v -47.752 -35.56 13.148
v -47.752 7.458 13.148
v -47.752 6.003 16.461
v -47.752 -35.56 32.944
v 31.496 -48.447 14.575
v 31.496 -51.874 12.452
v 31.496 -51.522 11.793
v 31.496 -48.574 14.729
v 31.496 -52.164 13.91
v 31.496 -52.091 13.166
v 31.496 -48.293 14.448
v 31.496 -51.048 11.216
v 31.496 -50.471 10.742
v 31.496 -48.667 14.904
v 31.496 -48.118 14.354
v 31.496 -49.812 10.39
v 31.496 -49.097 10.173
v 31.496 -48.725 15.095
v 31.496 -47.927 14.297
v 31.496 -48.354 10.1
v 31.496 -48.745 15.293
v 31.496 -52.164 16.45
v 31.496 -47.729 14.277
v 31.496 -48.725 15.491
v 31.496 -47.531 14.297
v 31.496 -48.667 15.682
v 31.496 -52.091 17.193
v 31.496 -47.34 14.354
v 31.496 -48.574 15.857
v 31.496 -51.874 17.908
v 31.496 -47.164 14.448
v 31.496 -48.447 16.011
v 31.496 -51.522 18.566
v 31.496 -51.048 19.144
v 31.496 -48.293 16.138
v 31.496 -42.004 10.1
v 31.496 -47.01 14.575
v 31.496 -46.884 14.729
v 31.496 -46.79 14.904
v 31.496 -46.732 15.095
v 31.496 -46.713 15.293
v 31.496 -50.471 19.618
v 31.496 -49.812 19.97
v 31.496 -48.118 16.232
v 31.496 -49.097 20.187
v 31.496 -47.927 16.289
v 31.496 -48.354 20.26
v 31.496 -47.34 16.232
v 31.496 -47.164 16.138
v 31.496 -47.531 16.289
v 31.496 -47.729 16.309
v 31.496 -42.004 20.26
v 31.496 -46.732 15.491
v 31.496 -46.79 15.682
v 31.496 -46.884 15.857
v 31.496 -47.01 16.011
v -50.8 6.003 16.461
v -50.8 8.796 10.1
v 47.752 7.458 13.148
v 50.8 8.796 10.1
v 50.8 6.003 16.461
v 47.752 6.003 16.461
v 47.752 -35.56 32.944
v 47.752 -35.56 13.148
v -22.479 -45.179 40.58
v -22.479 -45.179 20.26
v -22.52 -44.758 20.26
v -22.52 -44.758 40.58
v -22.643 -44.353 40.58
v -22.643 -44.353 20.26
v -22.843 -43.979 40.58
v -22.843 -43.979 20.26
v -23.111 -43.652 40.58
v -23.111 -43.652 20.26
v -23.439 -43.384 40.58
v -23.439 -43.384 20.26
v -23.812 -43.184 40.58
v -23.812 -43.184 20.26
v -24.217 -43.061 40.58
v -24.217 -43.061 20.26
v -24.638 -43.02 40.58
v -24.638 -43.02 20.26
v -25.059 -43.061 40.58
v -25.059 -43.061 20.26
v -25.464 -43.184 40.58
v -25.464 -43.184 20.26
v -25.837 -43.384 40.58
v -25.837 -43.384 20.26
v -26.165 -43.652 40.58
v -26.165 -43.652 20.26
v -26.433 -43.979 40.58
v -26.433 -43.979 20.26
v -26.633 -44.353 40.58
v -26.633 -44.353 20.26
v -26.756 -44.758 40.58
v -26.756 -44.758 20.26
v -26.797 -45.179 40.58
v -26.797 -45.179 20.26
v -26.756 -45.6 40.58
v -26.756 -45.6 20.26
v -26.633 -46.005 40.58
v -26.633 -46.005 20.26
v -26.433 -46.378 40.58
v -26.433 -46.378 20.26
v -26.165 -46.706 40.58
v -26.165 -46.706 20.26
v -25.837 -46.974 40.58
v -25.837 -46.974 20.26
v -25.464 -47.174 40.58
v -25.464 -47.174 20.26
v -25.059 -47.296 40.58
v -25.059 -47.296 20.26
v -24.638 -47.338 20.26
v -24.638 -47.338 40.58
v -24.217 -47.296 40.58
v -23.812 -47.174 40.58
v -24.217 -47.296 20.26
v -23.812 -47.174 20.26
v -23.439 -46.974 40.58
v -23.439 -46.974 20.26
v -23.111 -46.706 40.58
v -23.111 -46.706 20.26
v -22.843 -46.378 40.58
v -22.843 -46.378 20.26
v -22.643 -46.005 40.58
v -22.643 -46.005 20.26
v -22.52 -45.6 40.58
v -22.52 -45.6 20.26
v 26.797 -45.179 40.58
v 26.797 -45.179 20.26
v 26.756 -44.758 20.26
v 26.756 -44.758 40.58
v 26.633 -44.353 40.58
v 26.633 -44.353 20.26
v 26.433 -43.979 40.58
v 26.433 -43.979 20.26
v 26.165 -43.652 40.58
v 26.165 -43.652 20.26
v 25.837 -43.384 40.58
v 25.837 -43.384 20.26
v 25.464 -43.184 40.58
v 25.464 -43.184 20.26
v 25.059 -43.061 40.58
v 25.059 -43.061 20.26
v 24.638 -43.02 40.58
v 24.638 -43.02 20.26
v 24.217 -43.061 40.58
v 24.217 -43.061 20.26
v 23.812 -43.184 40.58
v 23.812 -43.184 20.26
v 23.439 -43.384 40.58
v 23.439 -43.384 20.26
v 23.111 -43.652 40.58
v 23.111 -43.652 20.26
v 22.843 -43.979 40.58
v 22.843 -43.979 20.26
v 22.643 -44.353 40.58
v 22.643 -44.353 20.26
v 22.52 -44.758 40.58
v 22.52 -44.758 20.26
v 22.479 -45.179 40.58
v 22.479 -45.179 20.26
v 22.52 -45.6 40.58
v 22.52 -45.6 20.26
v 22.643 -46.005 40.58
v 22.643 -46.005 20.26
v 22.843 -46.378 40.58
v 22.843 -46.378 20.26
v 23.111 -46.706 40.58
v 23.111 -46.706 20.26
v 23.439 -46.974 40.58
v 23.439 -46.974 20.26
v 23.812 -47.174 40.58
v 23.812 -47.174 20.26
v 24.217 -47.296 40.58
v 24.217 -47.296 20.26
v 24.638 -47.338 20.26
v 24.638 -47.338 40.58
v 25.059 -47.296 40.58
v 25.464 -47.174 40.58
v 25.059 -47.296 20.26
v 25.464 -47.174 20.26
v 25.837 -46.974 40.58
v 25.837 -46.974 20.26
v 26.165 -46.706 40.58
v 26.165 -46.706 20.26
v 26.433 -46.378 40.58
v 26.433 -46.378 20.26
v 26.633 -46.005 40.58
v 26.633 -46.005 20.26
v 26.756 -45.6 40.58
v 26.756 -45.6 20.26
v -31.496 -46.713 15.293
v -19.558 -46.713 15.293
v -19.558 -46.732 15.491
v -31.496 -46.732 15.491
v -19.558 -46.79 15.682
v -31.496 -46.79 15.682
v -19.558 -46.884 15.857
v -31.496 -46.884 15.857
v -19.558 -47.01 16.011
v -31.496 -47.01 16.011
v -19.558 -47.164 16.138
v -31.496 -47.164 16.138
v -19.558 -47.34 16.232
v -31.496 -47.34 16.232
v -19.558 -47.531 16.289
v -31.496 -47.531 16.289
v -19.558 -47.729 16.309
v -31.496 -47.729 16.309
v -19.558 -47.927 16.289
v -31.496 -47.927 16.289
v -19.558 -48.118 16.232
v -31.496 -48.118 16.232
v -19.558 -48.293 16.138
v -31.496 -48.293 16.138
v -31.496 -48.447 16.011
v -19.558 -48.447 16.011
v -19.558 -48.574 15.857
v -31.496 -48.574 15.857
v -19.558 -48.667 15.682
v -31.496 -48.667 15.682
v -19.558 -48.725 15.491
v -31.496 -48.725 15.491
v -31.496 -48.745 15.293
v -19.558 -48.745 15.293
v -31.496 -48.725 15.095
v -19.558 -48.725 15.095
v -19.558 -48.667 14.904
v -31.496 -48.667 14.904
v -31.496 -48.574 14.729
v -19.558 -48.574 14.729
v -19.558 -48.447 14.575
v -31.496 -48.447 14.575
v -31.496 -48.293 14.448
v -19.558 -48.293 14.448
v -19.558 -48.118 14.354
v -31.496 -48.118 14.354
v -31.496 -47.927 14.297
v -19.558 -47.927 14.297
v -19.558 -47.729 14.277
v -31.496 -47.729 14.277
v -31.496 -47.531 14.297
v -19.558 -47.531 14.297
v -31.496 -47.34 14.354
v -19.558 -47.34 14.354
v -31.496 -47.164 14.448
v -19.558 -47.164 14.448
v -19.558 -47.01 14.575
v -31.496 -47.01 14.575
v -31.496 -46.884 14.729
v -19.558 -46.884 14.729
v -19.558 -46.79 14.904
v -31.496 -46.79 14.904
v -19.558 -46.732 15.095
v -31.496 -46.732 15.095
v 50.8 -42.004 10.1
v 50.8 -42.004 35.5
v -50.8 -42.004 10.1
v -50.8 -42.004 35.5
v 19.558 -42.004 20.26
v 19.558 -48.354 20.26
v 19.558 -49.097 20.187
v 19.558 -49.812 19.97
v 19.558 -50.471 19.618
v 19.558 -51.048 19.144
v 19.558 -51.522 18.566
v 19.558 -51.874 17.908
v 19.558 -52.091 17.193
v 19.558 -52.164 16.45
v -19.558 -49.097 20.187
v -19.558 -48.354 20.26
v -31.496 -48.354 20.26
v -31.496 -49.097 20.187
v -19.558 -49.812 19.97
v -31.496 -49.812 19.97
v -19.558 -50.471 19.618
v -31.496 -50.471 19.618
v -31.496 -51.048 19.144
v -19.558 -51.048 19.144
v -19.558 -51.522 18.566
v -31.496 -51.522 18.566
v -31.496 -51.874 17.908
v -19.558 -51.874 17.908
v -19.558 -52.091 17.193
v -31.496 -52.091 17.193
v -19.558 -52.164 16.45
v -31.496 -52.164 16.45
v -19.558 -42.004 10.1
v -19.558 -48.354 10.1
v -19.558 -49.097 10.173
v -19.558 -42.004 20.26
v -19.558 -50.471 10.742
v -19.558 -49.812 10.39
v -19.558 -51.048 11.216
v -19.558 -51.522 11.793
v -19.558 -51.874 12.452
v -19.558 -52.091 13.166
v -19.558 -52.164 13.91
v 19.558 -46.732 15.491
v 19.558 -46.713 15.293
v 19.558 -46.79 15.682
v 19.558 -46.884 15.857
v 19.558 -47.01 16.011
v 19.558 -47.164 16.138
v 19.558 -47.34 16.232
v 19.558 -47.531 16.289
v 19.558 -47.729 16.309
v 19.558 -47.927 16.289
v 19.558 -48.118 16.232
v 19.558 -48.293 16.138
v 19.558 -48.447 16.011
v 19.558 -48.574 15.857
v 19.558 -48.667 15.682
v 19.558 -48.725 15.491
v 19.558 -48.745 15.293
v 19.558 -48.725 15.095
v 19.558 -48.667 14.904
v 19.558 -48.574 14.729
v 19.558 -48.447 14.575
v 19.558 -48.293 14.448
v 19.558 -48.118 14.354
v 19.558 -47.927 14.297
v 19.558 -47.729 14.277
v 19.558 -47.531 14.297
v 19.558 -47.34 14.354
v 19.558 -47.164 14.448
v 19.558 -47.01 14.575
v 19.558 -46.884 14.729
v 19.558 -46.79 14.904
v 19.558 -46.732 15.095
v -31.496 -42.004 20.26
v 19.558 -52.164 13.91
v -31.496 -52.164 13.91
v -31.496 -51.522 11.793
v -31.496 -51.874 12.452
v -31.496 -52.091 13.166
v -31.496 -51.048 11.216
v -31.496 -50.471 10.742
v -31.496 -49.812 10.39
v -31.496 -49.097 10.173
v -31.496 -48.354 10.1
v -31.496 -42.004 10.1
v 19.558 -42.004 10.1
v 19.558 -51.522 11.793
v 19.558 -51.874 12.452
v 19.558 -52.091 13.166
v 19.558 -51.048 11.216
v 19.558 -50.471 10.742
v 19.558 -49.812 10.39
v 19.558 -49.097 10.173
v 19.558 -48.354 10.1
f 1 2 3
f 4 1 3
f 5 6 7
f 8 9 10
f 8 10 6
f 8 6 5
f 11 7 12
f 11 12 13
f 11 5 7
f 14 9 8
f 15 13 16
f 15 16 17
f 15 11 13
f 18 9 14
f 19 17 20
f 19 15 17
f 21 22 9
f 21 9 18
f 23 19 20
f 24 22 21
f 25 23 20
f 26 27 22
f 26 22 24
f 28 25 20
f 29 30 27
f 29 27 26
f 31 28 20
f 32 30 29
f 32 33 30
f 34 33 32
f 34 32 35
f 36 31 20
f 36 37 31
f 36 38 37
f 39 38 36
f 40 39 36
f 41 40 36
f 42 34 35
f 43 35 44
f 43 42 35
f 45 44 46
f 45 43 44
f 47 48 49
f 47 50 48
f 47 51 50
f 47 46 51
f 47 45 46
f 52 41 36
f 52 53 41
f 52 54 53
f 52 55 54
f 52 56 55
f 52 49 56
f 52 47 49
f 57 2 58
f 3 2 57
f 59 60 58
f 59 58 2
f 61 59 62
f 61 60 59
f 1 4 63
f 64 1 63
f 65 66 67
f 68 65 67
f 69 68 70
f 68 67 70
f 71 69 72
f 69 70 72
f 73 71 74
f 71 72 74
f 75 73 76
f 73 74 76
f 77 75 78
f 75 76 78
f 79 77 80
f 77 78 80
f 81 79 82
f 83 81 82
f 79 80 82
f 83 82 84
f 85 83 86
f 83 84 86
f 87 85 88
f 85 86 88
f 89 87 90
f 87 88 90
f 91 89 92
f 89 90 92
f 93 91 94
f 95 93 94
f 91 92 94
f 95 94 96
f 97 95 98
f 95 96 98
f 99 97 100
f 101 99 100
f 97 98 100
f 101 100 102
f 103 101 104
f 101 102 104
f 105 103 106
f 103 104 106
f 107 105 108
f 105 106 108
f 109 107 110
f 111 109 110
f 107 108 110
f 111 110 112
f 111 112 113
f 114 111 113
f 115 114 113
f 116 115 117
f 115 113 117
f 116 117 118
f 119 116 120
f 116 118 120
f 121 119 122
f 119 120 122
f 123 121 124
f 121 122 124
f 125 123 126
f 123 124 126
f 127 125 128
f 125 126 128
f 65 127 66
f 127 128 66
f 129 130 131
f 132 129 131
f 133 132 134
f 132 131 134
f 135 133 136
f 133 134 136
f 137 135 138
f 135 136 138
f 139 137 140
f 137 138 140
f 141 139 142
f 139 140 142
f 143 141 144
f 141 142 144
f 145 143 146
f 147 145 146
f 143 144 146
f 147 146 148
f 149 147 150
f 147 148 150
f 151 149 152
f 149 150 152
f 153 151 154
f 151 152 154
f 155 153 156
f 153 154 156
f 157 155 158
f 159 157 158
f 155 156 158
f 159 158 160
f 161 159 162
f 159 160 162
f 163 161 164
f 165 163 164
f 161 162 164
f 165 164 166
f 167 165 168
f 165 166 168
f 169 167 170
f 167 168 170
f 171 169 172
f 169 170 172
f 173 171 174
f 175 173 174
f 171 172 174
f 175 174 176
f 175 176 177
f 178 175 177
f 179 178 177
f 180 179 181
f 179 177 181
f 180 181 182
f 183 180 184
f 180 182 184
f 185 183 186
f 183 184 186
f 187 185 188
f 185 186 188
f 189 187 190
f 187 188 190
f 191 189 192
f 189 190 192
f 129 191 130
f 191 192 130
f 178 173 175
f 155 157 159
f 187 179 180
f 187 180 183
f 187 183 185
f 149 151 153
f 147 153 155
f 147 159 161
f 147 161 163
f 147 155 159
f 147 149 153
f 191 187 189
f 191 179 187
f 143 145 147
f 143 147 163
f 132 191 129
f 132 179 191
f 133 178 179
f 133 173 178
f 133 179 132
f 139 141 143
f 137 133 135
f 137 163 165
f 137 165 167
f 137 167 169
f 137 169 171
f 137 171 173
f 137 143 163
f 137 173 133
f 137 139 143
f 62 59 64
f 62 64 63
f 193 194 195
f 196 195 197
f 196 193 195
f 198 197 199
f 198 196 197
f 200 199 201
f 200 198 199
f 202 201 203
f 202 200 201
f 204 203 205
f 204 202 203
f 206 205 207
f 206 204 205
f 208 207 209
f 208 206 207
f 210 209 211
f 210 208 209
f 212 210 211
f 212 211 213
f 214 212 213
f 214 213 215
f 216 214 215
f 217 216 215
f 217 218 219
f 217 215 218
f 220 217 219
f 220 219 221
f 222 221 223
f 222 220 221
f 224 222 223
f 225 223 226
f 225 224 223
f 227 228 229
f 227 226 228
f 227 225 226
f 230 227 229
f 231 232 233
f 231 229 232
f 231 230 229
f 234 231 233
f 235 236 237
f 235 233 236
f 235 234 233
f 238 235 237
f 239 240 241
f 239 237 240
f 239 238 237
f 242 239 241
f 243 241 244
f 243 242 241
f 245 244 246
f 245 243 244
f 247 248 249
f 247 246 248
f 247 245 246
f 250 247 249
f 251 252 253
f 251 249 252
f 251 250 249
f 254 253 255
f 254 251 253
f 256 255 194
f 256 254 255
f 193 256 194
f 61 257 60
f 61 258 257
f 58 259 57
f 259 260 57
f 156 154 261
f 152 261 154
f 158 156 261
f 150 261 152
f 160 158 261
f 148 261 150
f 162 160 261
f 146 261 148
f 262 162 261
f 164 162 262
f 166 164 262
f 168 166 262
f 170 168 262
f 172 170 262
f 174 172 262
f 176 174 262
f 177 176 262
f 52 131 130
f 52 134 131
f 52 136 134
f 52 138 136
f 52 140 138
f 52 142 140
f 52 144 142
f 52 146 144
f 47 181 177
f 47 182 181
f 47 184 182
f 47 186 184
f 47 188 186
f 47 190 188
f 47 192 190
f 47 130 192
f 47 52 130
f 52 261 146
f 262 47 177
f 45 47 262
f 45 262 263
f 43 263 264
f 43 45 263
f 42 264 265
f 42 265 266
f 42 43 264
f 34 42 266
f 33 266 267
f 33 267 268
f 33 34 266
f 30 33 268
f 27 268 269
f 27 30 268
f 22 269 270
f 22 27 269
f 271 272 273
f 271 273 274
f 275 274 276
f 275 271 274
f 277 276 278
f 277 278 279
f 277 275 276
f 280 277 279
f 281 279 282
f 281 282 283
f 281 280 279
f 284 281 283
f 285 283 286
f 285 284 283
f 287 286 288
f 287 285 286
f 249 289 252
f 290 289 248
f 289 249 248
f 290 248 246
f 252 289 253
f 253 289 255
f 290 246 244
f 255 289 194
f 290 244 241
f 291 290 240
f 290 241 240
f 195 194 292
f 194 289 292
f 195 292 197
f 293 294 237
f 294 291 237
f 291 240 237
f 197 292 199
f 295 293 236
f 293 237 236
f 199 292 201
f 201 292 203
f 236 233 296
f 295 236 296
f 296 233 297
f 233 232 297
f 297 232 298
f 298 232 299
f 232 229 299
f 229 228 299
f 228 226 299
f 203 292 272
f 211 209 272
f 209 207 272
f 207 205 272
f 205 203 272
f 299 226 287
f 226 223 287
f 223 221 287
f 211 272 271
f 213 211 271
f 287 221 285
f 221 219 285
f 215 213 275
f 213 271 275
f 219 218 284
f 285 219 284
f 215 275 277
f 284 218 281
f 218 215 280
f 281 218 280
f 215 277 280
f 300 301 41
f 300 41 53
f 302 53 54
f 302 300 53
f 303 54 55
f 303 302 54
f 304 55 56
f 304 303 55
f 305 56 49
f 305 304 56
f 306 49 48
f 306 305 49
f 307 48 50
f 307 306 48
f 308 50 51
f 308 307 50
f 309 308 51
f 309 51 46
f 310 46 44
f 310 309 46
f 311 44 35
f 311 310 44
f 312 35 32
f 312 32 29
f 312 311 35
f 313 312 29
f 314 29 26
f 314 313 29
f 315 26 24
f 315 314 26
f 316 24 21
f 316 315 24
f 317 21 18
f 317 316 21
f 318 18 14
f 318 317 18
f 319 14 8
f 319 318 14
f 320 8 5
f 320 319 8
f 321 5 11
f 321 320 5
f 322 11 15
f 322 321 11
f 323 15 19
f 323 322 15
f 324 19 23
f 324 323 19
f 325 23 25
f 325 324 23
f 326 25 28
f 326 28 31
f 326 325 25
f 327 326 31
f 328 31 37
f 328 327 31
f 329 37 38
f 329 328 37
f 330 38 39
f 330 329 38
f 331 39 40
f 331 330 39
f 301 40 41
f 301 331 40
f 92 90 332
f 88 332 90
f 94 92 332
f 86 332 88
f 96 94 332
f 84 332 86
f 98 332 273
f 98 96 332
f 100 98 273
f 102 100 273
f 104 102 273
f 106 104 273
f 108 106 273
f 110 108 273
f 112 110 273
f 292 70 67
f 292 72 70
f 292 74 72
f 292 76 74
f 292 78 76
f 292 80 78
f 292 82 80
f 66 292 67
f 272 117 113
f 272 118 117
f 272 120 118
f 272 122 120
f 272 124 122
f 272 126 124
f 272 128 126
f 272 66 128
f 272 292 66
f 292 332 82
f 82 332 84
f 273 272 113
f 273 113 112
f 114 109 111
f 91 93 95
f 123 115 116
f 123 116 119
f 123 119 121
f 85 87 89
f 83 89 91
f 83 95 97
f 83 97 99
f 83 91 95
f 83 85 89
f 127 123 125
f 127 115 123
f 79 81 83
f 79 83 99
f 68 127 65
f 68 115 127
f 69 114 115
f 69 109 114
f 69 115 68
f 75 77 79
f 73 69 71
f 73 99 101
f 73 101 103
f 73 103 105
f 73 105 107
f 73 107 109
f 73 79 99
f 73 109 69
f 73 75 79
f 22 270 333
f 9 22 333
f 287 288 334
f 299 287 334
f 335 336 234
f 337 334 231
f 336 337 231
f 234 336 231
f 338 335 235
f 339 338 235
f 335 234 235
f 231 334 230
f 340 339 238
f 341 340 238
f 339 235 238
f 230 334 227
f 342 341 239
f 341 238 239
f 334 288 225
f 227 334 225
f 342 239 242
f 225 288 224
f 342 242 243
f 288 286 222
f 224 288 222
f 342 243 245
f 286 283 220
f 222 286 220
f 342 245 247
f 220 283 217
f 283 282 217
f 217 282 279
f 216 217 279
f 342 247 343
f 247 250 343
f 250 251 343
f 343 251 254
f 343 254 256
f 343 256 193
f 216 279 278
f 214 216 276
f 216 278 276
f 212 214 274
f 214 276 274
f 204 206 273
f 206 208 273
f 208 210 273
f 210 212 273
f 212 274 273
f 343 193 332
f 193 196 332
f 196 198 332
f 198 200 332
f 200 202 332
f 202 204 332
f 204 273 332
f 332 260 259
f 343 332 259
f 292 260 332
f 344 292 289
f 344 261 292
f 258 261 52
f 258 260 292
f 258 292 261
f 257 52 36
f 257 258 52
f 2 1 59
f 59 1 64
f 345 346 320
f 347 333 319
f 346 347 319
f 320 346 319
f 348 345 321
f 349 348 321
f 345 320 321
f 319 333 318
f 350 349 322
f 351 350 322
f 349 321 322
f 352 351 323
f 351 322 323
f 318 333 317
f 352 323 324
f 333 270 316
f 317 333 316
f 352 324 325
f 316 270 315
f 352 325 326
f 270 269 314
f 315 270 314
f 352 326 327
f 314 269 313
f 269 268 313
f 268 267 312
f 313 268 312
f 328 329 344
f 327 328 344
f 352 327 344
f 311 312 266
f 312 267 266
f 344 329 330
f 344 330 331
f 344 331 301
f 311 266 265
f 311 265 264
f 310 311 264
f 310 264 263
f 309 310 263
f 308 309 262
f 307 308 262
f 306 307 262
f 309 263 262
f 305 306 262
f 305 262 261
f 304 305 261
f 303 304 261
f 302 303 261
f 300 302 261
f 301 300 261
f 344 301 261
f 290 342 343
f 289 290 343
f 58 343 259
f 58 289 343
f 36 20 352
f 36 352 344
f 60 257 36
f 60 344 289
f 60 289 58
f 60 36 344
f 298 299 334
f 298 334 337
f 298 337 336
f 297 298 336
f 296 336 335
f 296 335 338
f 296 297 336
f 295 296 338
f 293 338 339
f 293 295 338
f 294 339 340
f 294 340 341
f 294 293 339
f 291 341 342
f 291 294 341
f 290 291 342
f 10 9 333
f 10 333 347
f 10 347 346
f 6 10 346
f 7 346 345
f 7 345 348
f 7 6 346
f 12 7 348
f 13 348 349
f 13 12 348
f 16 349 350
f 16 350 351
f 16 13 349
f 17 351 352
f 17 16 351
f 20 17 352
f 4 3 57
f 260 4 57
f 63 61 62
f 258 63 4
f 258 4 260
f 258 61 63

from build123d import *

# Parameters (mm, degrees)
F1_DEPTH = 50.8
F0_R     = 1.016
F2_DEPTH = 31.496
F3_R     = 2.159
F4_DEPTH = 20.32
F3_W     = 39.116
F3_H     = 6.35
F3_H_2   = 9.431579427
F5_DEPTH = 25.4
F6_W     = 95.504
F6_H     = 27.8849071284
F7_DEPTH = 35.56


with BuildPart() as f1:
    # F0 (on Right) → F1 (new body, symmetric)
    with BuildSketch(Plane.YZ):
        Polygon((-42.0039315899, 10.0997092374), (-35.6157857536, 10.0997092374), (8.7960684101, 10.0997092374), (6.0031614266, 16.4607279003), (-42.0039315899, 35.4997092374), (-42.0039315899, 20.2597092374), align=None)
    extrude(amount=F1_DEPTH, both=True)

    # F0 (on Right) → F2 (join, symmetric)
    with BuildSketch(Plane.YZ):
        with BuildLine():
            Line((-48.3539315899, 10.0997092374), (-42.0039315899, 10.0997092374))
            Line((-42.0039315899, 10.0997092374), (-42.0039315899, 20.2597092374))
            Line((-42.0039315899, 20.2597092374), (-48.3539315899, 20.2597092374))
            ThreePointArc((-48.3539315899, 20.2597092374), (-51.0480084262, 19.1437860737), (-52.1639315899, 16.4497092374))
            Line((-52.1639315899, 16.4497092374), (-52.1639315899, 13.9097092374))
            ThreePointArc((-52.1639315899, 13.9097092374), (-51.0480084262, 11.215632401), (-48.3539315899, 10.0997092374))
        make_face()
        with Locations((-47.7287806571, 15.2929993346)):
            Circle(F0_R, mode=Mode.SUBTRACT)
    extrude(amount=F2_DEPTH, both=True)

    # F3 (on face) → F4 (join)
    with BuildSketch(Plane.XY.offset(20.2597092374)):
        with Locations((-24.638, -45.1789315899)):
            Circle(F3_R)
        with Locations((24.638, -45.1789315899)):
            Circle(F3_R)
    extrude(amount=F4_DEPTH)

    # F3 (on face) → F5 (cut)
    with BuildSketch(Plane.XY.offset(20.2597092374)):
        with Locations((0, -45.1789315899)):
            Rectangle(F3_W, F3_H)
        with Locations((0, -53.0697213034)):
            Rectangle(F3_W, F3_H_2)
    extrude(amount=-F5_DEPTH, mode=Mode.SUBTRACT)

    # F6 (on Front) → F7 (cut, symmetric)
    with BuildSketch(Plane.XZ):
        with Locations((0, 27.0901628016)):
            Rectangle(F6_W, F6_H)
    extrude(amount=F7_DEPTH, both=True, mode=Mode.SUBTRACT)


solid = f1.part
